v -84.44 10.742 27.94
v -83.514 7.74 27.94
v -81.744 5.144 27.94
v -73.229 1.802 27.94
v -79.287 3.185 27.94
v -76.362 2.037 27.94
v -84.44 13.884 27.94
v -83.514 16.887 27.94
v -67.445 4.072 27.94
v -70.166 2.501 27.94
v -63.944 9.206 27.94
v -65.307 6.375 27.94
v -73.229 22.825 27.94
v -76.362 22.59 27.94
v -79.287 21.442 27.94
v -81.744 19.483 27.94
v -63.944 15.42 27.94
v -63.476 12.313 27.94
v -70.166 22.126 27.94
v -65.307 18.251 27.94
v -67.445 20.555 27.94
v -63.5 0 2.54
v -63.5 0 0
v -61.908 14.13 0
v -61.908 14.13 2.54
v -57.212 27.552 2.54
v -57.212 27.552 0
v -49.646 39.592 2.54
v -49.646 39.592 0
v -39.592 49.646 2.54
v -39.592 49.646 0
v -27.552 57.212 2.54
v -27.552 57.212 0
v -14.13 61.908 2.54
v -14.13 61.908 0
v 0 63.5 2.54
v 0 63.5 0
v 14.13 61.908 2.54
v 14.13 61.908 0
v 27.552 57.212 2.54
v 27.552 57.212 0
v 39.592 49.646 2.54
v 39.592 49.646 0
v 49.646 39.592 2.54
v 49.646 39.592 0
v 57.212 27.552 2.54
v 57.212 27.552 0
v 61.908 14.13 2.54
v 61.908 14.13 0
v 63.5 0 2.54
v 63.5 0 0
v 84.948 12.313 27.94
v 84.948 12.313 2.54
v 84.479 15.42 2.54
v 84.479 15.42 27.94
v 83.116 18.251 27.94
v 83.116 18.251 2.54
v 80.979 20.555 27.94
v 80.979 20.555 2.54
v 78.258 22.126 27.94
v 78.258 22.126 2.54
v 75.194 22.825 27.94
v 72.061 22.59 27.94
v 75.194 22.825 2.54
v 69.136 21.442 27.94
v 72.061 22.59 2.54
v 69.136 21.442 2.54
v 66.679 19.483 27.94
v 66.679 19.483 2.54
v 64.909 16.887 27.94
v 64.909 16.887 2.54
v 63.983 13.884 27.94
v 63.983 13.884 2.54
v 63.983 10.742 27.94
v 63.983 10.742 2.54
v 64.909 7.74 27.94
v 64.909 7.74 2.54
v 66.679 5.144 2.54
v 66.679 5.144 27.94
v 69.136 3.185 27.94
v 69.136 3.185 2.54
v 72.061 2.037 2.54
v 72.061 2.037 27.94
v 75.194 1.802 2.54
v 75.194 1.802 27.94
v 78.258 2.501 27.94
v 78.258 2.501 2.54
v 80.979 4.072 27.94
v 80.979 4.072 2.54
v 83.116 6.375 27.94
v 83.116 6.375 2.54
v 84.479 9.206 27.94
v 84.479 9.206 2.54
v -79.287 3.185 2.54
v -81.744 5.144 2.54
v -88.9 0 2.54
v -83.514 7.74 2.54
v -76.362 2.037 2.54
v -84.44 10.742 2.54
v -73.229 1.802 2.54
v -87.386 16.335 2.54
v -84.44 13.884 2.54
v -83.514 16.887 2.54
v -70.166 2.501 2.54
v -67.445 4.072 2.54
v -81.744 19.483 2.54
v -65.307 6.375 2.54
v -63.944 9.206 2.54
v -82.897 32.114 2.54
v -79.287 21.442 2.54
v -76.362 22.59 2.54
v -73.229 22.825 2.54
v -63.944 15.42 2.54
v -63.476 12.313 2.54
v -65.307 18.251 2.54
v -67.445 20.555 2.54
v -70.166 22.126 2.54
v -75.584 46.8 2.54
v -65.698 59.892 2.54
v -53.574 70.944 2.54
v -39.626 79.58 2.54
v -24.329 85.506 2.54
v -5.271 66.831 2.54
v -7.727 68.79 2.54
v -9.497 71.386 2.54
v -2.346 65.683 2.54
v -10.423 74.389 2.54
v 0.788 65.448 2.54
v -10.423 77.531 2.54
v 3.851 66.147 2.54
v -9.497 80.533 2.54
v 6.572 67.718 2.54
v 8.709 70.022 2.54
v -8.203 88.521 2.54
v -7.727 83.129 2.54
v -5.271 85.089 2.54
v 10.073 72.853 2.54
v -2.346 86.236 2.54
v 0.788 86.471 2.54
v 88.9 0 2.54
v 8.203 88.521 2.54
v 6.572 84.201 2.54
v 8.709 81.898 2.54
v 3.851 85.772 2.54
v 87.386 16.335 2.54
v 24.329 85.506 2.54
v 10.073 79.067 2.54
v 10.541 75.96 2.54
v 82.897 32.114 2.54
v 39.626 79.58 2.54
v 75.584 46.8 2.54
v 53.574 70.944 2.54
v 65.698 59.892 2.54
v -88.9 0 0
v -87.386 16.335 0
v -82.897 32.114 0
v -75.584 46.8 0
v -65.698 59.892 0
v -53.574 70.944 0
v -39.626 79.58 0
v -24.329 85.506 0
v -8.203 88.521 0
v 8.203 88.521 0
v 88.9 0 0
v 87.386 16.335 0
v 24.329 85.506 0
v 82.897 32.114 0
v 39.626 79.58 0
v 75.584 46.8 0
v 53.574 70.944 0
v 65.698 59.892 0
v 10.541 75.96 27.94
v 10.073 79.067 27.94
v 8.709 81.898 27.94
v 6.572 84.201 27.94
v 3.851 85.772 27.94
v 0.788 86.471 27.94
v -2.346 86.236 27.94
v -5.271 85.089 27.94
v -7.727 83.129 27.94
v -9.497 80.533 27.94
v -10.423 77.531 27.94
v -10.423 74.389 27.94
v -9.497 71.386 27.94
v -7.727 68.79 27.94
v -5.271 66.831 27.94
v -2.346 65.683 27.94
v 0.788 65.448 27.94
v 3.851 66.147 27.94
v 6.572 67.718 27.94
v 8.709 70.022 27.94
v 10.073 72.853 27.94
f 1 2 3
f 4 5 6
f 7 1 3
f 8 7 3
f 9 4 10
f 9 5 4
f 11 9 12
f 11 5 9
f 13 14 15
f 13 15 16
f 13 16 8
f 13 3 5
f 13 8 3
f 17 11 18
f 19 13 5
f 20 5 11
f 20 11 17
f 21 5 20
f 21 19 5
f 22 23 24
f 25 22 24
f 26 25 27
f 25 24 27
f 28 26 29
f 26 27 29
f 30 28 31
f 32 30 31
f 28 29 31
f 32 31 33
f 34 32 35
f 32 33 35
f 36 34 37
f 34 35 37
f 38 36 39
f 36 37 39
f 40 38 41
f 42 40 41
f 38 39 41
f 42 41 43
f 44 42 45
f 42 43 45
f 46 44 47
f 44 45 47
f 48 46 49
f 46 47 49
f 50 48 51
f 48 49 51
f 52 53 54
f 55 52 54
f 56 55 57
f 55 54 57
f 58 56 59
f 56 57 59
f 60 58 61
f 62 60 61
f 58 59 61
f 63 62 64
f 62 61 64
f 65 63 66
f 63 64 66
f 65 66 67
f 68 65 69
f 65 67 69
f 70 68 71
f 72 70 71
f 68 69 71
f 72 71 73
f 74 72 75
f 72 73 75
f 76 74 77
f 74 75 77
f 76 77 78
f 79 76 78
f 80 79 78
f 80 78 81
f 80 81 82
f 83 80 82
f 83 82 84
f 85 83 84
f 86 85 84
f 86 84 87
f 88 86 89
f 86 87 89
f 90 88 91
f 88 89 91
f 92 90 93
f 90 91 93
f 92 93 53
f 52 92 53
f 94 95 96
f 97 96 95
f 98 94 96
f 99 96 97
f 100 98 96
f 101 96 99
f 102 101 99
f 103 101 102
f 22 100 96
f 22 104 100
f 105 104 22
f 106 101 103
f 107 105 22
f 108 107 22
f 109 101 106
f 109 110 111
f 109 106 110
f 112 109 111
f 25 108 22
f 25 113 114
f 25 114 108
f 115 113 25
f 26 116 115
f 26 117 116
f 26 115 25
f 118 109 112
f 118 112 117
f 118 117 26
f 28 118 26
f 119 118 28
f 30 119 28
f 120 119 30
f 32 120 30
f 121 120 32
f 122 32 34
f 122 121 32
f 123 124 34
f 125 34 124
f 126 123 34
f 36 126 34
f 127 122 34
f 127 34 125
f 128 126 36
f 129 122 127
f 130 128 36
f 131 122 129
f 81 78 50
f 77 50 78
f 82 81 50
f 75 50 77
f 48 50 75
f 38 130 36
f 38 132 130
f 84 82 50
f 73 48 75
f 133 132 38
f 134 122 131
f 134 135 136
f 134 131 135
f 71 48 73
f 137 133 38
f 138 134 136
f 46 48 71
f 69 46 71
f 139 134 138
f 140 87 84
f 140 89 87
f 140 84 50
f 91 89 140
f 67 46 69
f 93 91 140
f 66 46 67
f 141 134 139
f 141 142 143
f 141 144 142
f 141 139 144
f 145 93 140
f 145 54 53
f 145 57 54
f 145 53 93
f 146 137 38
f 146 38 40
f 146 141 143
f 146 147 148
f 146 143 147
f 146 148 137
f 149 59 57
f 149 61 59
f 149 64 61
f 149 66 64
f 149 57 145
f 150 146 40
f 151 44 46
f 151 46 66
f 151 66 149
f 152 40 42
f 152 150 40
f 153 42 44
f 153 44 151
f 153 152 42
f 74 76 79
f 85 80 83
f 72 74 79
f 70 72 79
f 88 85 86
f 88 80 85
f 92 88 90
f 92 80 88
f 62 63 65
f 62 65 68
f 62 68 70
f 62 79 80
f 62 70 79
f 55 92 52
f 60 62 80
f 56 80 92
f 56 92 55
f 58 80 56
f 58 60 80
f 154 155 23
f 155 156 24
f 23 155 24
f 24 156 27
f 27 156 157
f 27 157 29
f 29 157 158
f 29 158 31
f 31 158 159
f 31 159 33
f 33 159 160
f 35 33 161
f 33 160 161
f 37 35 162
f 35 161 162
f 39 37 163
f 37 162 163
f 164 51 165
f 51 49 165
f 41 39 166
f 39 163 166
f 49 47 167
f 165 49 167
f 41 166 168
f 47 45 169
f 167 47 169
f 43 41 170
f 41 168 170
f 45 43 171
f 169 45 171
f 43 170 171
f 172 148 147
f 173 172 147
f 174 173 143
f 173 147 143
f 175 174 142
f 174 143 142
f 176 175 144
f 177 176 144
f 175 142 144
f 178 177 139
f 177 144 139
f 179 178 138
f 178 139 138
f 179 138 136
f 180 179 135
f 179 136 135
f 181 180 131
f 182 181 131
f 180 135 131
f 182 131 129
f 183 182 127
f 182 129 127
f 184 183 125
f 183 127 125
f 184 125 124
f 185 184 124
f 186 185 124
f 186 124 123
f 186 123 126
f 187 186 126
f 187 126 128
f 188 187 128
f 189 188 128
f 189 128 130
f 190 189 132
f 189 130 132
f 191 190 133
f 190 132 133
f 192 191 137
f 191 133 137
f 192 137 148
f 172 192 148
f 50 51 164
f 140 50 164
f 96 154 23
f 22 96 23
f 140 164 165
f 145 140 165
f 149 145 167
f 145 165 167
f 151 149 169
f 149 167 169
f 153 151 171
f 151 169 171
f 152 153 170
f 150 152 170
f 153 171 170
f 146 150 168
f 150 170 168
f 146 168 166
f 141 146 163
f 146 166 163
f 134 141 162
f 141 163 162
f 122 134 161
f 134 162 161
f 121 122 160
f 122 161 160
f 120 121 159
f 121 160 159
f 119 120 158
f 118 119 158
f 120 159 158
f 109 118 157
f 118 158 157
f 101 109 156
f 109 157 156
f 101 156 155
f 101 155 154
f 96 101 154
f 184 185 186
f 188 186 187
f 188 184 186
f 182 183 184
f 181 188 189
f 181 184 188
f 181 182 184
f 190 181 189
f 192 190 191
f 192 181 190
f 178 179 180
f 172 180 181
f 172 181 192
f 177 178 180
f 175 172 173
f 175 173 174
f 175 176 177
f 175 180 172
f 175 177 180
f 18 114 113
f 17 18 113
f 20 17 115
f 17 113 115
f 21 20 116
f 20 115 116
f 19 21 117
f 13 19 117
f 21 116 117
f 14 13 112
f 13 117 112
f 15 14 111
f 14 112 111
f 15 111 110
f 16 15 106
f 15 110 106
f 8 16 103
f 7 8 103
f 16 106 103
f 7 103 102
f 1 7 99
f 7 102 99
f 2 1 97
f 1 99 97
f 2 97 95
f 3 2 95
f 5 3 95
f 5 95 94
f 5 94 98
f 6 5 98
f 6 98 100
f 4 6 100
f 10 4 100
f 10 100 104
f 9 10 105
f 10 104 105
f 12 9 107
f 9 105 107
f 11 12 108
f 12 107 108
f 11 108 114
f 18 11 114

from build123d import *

# Parameters (mm, degrees)
F1_DEPTH = 2.54
F2_R     = 10.541
F3_DEPTH = 25.4


with BuildPart() as f1:
    # F0 (on Top) → F1 (new body)
    with BuildSketch(Plane.XY):
        with BuildLine():
            Line((63.5, 0), (88.9, 0))
            ThreePointArc((88.9, 0), (0, 88.9), (-88.9, 0))
            Line((-88.9, 0), (-63.5, 0))
            ThreePointArc((-63.5, 0), (0, 63.5), (63.5, 0))
        make_face()
    extrude(amount=F1_DEPTH)

    # F2 (on face) → F3 (join)
    with BuildSketch(Plane.XY.offset(2.54)):
        with Locations((0, 75.959727)):
            Circle(F2_R)
        with Locations((-74.016793, 12.313276)):
            Circle(F2_R)
        with Locations((74.406557, 12.313276)):
            Circle(F2_R)
    extrude(amount=F3_DEPTH)


solid = f1.part
